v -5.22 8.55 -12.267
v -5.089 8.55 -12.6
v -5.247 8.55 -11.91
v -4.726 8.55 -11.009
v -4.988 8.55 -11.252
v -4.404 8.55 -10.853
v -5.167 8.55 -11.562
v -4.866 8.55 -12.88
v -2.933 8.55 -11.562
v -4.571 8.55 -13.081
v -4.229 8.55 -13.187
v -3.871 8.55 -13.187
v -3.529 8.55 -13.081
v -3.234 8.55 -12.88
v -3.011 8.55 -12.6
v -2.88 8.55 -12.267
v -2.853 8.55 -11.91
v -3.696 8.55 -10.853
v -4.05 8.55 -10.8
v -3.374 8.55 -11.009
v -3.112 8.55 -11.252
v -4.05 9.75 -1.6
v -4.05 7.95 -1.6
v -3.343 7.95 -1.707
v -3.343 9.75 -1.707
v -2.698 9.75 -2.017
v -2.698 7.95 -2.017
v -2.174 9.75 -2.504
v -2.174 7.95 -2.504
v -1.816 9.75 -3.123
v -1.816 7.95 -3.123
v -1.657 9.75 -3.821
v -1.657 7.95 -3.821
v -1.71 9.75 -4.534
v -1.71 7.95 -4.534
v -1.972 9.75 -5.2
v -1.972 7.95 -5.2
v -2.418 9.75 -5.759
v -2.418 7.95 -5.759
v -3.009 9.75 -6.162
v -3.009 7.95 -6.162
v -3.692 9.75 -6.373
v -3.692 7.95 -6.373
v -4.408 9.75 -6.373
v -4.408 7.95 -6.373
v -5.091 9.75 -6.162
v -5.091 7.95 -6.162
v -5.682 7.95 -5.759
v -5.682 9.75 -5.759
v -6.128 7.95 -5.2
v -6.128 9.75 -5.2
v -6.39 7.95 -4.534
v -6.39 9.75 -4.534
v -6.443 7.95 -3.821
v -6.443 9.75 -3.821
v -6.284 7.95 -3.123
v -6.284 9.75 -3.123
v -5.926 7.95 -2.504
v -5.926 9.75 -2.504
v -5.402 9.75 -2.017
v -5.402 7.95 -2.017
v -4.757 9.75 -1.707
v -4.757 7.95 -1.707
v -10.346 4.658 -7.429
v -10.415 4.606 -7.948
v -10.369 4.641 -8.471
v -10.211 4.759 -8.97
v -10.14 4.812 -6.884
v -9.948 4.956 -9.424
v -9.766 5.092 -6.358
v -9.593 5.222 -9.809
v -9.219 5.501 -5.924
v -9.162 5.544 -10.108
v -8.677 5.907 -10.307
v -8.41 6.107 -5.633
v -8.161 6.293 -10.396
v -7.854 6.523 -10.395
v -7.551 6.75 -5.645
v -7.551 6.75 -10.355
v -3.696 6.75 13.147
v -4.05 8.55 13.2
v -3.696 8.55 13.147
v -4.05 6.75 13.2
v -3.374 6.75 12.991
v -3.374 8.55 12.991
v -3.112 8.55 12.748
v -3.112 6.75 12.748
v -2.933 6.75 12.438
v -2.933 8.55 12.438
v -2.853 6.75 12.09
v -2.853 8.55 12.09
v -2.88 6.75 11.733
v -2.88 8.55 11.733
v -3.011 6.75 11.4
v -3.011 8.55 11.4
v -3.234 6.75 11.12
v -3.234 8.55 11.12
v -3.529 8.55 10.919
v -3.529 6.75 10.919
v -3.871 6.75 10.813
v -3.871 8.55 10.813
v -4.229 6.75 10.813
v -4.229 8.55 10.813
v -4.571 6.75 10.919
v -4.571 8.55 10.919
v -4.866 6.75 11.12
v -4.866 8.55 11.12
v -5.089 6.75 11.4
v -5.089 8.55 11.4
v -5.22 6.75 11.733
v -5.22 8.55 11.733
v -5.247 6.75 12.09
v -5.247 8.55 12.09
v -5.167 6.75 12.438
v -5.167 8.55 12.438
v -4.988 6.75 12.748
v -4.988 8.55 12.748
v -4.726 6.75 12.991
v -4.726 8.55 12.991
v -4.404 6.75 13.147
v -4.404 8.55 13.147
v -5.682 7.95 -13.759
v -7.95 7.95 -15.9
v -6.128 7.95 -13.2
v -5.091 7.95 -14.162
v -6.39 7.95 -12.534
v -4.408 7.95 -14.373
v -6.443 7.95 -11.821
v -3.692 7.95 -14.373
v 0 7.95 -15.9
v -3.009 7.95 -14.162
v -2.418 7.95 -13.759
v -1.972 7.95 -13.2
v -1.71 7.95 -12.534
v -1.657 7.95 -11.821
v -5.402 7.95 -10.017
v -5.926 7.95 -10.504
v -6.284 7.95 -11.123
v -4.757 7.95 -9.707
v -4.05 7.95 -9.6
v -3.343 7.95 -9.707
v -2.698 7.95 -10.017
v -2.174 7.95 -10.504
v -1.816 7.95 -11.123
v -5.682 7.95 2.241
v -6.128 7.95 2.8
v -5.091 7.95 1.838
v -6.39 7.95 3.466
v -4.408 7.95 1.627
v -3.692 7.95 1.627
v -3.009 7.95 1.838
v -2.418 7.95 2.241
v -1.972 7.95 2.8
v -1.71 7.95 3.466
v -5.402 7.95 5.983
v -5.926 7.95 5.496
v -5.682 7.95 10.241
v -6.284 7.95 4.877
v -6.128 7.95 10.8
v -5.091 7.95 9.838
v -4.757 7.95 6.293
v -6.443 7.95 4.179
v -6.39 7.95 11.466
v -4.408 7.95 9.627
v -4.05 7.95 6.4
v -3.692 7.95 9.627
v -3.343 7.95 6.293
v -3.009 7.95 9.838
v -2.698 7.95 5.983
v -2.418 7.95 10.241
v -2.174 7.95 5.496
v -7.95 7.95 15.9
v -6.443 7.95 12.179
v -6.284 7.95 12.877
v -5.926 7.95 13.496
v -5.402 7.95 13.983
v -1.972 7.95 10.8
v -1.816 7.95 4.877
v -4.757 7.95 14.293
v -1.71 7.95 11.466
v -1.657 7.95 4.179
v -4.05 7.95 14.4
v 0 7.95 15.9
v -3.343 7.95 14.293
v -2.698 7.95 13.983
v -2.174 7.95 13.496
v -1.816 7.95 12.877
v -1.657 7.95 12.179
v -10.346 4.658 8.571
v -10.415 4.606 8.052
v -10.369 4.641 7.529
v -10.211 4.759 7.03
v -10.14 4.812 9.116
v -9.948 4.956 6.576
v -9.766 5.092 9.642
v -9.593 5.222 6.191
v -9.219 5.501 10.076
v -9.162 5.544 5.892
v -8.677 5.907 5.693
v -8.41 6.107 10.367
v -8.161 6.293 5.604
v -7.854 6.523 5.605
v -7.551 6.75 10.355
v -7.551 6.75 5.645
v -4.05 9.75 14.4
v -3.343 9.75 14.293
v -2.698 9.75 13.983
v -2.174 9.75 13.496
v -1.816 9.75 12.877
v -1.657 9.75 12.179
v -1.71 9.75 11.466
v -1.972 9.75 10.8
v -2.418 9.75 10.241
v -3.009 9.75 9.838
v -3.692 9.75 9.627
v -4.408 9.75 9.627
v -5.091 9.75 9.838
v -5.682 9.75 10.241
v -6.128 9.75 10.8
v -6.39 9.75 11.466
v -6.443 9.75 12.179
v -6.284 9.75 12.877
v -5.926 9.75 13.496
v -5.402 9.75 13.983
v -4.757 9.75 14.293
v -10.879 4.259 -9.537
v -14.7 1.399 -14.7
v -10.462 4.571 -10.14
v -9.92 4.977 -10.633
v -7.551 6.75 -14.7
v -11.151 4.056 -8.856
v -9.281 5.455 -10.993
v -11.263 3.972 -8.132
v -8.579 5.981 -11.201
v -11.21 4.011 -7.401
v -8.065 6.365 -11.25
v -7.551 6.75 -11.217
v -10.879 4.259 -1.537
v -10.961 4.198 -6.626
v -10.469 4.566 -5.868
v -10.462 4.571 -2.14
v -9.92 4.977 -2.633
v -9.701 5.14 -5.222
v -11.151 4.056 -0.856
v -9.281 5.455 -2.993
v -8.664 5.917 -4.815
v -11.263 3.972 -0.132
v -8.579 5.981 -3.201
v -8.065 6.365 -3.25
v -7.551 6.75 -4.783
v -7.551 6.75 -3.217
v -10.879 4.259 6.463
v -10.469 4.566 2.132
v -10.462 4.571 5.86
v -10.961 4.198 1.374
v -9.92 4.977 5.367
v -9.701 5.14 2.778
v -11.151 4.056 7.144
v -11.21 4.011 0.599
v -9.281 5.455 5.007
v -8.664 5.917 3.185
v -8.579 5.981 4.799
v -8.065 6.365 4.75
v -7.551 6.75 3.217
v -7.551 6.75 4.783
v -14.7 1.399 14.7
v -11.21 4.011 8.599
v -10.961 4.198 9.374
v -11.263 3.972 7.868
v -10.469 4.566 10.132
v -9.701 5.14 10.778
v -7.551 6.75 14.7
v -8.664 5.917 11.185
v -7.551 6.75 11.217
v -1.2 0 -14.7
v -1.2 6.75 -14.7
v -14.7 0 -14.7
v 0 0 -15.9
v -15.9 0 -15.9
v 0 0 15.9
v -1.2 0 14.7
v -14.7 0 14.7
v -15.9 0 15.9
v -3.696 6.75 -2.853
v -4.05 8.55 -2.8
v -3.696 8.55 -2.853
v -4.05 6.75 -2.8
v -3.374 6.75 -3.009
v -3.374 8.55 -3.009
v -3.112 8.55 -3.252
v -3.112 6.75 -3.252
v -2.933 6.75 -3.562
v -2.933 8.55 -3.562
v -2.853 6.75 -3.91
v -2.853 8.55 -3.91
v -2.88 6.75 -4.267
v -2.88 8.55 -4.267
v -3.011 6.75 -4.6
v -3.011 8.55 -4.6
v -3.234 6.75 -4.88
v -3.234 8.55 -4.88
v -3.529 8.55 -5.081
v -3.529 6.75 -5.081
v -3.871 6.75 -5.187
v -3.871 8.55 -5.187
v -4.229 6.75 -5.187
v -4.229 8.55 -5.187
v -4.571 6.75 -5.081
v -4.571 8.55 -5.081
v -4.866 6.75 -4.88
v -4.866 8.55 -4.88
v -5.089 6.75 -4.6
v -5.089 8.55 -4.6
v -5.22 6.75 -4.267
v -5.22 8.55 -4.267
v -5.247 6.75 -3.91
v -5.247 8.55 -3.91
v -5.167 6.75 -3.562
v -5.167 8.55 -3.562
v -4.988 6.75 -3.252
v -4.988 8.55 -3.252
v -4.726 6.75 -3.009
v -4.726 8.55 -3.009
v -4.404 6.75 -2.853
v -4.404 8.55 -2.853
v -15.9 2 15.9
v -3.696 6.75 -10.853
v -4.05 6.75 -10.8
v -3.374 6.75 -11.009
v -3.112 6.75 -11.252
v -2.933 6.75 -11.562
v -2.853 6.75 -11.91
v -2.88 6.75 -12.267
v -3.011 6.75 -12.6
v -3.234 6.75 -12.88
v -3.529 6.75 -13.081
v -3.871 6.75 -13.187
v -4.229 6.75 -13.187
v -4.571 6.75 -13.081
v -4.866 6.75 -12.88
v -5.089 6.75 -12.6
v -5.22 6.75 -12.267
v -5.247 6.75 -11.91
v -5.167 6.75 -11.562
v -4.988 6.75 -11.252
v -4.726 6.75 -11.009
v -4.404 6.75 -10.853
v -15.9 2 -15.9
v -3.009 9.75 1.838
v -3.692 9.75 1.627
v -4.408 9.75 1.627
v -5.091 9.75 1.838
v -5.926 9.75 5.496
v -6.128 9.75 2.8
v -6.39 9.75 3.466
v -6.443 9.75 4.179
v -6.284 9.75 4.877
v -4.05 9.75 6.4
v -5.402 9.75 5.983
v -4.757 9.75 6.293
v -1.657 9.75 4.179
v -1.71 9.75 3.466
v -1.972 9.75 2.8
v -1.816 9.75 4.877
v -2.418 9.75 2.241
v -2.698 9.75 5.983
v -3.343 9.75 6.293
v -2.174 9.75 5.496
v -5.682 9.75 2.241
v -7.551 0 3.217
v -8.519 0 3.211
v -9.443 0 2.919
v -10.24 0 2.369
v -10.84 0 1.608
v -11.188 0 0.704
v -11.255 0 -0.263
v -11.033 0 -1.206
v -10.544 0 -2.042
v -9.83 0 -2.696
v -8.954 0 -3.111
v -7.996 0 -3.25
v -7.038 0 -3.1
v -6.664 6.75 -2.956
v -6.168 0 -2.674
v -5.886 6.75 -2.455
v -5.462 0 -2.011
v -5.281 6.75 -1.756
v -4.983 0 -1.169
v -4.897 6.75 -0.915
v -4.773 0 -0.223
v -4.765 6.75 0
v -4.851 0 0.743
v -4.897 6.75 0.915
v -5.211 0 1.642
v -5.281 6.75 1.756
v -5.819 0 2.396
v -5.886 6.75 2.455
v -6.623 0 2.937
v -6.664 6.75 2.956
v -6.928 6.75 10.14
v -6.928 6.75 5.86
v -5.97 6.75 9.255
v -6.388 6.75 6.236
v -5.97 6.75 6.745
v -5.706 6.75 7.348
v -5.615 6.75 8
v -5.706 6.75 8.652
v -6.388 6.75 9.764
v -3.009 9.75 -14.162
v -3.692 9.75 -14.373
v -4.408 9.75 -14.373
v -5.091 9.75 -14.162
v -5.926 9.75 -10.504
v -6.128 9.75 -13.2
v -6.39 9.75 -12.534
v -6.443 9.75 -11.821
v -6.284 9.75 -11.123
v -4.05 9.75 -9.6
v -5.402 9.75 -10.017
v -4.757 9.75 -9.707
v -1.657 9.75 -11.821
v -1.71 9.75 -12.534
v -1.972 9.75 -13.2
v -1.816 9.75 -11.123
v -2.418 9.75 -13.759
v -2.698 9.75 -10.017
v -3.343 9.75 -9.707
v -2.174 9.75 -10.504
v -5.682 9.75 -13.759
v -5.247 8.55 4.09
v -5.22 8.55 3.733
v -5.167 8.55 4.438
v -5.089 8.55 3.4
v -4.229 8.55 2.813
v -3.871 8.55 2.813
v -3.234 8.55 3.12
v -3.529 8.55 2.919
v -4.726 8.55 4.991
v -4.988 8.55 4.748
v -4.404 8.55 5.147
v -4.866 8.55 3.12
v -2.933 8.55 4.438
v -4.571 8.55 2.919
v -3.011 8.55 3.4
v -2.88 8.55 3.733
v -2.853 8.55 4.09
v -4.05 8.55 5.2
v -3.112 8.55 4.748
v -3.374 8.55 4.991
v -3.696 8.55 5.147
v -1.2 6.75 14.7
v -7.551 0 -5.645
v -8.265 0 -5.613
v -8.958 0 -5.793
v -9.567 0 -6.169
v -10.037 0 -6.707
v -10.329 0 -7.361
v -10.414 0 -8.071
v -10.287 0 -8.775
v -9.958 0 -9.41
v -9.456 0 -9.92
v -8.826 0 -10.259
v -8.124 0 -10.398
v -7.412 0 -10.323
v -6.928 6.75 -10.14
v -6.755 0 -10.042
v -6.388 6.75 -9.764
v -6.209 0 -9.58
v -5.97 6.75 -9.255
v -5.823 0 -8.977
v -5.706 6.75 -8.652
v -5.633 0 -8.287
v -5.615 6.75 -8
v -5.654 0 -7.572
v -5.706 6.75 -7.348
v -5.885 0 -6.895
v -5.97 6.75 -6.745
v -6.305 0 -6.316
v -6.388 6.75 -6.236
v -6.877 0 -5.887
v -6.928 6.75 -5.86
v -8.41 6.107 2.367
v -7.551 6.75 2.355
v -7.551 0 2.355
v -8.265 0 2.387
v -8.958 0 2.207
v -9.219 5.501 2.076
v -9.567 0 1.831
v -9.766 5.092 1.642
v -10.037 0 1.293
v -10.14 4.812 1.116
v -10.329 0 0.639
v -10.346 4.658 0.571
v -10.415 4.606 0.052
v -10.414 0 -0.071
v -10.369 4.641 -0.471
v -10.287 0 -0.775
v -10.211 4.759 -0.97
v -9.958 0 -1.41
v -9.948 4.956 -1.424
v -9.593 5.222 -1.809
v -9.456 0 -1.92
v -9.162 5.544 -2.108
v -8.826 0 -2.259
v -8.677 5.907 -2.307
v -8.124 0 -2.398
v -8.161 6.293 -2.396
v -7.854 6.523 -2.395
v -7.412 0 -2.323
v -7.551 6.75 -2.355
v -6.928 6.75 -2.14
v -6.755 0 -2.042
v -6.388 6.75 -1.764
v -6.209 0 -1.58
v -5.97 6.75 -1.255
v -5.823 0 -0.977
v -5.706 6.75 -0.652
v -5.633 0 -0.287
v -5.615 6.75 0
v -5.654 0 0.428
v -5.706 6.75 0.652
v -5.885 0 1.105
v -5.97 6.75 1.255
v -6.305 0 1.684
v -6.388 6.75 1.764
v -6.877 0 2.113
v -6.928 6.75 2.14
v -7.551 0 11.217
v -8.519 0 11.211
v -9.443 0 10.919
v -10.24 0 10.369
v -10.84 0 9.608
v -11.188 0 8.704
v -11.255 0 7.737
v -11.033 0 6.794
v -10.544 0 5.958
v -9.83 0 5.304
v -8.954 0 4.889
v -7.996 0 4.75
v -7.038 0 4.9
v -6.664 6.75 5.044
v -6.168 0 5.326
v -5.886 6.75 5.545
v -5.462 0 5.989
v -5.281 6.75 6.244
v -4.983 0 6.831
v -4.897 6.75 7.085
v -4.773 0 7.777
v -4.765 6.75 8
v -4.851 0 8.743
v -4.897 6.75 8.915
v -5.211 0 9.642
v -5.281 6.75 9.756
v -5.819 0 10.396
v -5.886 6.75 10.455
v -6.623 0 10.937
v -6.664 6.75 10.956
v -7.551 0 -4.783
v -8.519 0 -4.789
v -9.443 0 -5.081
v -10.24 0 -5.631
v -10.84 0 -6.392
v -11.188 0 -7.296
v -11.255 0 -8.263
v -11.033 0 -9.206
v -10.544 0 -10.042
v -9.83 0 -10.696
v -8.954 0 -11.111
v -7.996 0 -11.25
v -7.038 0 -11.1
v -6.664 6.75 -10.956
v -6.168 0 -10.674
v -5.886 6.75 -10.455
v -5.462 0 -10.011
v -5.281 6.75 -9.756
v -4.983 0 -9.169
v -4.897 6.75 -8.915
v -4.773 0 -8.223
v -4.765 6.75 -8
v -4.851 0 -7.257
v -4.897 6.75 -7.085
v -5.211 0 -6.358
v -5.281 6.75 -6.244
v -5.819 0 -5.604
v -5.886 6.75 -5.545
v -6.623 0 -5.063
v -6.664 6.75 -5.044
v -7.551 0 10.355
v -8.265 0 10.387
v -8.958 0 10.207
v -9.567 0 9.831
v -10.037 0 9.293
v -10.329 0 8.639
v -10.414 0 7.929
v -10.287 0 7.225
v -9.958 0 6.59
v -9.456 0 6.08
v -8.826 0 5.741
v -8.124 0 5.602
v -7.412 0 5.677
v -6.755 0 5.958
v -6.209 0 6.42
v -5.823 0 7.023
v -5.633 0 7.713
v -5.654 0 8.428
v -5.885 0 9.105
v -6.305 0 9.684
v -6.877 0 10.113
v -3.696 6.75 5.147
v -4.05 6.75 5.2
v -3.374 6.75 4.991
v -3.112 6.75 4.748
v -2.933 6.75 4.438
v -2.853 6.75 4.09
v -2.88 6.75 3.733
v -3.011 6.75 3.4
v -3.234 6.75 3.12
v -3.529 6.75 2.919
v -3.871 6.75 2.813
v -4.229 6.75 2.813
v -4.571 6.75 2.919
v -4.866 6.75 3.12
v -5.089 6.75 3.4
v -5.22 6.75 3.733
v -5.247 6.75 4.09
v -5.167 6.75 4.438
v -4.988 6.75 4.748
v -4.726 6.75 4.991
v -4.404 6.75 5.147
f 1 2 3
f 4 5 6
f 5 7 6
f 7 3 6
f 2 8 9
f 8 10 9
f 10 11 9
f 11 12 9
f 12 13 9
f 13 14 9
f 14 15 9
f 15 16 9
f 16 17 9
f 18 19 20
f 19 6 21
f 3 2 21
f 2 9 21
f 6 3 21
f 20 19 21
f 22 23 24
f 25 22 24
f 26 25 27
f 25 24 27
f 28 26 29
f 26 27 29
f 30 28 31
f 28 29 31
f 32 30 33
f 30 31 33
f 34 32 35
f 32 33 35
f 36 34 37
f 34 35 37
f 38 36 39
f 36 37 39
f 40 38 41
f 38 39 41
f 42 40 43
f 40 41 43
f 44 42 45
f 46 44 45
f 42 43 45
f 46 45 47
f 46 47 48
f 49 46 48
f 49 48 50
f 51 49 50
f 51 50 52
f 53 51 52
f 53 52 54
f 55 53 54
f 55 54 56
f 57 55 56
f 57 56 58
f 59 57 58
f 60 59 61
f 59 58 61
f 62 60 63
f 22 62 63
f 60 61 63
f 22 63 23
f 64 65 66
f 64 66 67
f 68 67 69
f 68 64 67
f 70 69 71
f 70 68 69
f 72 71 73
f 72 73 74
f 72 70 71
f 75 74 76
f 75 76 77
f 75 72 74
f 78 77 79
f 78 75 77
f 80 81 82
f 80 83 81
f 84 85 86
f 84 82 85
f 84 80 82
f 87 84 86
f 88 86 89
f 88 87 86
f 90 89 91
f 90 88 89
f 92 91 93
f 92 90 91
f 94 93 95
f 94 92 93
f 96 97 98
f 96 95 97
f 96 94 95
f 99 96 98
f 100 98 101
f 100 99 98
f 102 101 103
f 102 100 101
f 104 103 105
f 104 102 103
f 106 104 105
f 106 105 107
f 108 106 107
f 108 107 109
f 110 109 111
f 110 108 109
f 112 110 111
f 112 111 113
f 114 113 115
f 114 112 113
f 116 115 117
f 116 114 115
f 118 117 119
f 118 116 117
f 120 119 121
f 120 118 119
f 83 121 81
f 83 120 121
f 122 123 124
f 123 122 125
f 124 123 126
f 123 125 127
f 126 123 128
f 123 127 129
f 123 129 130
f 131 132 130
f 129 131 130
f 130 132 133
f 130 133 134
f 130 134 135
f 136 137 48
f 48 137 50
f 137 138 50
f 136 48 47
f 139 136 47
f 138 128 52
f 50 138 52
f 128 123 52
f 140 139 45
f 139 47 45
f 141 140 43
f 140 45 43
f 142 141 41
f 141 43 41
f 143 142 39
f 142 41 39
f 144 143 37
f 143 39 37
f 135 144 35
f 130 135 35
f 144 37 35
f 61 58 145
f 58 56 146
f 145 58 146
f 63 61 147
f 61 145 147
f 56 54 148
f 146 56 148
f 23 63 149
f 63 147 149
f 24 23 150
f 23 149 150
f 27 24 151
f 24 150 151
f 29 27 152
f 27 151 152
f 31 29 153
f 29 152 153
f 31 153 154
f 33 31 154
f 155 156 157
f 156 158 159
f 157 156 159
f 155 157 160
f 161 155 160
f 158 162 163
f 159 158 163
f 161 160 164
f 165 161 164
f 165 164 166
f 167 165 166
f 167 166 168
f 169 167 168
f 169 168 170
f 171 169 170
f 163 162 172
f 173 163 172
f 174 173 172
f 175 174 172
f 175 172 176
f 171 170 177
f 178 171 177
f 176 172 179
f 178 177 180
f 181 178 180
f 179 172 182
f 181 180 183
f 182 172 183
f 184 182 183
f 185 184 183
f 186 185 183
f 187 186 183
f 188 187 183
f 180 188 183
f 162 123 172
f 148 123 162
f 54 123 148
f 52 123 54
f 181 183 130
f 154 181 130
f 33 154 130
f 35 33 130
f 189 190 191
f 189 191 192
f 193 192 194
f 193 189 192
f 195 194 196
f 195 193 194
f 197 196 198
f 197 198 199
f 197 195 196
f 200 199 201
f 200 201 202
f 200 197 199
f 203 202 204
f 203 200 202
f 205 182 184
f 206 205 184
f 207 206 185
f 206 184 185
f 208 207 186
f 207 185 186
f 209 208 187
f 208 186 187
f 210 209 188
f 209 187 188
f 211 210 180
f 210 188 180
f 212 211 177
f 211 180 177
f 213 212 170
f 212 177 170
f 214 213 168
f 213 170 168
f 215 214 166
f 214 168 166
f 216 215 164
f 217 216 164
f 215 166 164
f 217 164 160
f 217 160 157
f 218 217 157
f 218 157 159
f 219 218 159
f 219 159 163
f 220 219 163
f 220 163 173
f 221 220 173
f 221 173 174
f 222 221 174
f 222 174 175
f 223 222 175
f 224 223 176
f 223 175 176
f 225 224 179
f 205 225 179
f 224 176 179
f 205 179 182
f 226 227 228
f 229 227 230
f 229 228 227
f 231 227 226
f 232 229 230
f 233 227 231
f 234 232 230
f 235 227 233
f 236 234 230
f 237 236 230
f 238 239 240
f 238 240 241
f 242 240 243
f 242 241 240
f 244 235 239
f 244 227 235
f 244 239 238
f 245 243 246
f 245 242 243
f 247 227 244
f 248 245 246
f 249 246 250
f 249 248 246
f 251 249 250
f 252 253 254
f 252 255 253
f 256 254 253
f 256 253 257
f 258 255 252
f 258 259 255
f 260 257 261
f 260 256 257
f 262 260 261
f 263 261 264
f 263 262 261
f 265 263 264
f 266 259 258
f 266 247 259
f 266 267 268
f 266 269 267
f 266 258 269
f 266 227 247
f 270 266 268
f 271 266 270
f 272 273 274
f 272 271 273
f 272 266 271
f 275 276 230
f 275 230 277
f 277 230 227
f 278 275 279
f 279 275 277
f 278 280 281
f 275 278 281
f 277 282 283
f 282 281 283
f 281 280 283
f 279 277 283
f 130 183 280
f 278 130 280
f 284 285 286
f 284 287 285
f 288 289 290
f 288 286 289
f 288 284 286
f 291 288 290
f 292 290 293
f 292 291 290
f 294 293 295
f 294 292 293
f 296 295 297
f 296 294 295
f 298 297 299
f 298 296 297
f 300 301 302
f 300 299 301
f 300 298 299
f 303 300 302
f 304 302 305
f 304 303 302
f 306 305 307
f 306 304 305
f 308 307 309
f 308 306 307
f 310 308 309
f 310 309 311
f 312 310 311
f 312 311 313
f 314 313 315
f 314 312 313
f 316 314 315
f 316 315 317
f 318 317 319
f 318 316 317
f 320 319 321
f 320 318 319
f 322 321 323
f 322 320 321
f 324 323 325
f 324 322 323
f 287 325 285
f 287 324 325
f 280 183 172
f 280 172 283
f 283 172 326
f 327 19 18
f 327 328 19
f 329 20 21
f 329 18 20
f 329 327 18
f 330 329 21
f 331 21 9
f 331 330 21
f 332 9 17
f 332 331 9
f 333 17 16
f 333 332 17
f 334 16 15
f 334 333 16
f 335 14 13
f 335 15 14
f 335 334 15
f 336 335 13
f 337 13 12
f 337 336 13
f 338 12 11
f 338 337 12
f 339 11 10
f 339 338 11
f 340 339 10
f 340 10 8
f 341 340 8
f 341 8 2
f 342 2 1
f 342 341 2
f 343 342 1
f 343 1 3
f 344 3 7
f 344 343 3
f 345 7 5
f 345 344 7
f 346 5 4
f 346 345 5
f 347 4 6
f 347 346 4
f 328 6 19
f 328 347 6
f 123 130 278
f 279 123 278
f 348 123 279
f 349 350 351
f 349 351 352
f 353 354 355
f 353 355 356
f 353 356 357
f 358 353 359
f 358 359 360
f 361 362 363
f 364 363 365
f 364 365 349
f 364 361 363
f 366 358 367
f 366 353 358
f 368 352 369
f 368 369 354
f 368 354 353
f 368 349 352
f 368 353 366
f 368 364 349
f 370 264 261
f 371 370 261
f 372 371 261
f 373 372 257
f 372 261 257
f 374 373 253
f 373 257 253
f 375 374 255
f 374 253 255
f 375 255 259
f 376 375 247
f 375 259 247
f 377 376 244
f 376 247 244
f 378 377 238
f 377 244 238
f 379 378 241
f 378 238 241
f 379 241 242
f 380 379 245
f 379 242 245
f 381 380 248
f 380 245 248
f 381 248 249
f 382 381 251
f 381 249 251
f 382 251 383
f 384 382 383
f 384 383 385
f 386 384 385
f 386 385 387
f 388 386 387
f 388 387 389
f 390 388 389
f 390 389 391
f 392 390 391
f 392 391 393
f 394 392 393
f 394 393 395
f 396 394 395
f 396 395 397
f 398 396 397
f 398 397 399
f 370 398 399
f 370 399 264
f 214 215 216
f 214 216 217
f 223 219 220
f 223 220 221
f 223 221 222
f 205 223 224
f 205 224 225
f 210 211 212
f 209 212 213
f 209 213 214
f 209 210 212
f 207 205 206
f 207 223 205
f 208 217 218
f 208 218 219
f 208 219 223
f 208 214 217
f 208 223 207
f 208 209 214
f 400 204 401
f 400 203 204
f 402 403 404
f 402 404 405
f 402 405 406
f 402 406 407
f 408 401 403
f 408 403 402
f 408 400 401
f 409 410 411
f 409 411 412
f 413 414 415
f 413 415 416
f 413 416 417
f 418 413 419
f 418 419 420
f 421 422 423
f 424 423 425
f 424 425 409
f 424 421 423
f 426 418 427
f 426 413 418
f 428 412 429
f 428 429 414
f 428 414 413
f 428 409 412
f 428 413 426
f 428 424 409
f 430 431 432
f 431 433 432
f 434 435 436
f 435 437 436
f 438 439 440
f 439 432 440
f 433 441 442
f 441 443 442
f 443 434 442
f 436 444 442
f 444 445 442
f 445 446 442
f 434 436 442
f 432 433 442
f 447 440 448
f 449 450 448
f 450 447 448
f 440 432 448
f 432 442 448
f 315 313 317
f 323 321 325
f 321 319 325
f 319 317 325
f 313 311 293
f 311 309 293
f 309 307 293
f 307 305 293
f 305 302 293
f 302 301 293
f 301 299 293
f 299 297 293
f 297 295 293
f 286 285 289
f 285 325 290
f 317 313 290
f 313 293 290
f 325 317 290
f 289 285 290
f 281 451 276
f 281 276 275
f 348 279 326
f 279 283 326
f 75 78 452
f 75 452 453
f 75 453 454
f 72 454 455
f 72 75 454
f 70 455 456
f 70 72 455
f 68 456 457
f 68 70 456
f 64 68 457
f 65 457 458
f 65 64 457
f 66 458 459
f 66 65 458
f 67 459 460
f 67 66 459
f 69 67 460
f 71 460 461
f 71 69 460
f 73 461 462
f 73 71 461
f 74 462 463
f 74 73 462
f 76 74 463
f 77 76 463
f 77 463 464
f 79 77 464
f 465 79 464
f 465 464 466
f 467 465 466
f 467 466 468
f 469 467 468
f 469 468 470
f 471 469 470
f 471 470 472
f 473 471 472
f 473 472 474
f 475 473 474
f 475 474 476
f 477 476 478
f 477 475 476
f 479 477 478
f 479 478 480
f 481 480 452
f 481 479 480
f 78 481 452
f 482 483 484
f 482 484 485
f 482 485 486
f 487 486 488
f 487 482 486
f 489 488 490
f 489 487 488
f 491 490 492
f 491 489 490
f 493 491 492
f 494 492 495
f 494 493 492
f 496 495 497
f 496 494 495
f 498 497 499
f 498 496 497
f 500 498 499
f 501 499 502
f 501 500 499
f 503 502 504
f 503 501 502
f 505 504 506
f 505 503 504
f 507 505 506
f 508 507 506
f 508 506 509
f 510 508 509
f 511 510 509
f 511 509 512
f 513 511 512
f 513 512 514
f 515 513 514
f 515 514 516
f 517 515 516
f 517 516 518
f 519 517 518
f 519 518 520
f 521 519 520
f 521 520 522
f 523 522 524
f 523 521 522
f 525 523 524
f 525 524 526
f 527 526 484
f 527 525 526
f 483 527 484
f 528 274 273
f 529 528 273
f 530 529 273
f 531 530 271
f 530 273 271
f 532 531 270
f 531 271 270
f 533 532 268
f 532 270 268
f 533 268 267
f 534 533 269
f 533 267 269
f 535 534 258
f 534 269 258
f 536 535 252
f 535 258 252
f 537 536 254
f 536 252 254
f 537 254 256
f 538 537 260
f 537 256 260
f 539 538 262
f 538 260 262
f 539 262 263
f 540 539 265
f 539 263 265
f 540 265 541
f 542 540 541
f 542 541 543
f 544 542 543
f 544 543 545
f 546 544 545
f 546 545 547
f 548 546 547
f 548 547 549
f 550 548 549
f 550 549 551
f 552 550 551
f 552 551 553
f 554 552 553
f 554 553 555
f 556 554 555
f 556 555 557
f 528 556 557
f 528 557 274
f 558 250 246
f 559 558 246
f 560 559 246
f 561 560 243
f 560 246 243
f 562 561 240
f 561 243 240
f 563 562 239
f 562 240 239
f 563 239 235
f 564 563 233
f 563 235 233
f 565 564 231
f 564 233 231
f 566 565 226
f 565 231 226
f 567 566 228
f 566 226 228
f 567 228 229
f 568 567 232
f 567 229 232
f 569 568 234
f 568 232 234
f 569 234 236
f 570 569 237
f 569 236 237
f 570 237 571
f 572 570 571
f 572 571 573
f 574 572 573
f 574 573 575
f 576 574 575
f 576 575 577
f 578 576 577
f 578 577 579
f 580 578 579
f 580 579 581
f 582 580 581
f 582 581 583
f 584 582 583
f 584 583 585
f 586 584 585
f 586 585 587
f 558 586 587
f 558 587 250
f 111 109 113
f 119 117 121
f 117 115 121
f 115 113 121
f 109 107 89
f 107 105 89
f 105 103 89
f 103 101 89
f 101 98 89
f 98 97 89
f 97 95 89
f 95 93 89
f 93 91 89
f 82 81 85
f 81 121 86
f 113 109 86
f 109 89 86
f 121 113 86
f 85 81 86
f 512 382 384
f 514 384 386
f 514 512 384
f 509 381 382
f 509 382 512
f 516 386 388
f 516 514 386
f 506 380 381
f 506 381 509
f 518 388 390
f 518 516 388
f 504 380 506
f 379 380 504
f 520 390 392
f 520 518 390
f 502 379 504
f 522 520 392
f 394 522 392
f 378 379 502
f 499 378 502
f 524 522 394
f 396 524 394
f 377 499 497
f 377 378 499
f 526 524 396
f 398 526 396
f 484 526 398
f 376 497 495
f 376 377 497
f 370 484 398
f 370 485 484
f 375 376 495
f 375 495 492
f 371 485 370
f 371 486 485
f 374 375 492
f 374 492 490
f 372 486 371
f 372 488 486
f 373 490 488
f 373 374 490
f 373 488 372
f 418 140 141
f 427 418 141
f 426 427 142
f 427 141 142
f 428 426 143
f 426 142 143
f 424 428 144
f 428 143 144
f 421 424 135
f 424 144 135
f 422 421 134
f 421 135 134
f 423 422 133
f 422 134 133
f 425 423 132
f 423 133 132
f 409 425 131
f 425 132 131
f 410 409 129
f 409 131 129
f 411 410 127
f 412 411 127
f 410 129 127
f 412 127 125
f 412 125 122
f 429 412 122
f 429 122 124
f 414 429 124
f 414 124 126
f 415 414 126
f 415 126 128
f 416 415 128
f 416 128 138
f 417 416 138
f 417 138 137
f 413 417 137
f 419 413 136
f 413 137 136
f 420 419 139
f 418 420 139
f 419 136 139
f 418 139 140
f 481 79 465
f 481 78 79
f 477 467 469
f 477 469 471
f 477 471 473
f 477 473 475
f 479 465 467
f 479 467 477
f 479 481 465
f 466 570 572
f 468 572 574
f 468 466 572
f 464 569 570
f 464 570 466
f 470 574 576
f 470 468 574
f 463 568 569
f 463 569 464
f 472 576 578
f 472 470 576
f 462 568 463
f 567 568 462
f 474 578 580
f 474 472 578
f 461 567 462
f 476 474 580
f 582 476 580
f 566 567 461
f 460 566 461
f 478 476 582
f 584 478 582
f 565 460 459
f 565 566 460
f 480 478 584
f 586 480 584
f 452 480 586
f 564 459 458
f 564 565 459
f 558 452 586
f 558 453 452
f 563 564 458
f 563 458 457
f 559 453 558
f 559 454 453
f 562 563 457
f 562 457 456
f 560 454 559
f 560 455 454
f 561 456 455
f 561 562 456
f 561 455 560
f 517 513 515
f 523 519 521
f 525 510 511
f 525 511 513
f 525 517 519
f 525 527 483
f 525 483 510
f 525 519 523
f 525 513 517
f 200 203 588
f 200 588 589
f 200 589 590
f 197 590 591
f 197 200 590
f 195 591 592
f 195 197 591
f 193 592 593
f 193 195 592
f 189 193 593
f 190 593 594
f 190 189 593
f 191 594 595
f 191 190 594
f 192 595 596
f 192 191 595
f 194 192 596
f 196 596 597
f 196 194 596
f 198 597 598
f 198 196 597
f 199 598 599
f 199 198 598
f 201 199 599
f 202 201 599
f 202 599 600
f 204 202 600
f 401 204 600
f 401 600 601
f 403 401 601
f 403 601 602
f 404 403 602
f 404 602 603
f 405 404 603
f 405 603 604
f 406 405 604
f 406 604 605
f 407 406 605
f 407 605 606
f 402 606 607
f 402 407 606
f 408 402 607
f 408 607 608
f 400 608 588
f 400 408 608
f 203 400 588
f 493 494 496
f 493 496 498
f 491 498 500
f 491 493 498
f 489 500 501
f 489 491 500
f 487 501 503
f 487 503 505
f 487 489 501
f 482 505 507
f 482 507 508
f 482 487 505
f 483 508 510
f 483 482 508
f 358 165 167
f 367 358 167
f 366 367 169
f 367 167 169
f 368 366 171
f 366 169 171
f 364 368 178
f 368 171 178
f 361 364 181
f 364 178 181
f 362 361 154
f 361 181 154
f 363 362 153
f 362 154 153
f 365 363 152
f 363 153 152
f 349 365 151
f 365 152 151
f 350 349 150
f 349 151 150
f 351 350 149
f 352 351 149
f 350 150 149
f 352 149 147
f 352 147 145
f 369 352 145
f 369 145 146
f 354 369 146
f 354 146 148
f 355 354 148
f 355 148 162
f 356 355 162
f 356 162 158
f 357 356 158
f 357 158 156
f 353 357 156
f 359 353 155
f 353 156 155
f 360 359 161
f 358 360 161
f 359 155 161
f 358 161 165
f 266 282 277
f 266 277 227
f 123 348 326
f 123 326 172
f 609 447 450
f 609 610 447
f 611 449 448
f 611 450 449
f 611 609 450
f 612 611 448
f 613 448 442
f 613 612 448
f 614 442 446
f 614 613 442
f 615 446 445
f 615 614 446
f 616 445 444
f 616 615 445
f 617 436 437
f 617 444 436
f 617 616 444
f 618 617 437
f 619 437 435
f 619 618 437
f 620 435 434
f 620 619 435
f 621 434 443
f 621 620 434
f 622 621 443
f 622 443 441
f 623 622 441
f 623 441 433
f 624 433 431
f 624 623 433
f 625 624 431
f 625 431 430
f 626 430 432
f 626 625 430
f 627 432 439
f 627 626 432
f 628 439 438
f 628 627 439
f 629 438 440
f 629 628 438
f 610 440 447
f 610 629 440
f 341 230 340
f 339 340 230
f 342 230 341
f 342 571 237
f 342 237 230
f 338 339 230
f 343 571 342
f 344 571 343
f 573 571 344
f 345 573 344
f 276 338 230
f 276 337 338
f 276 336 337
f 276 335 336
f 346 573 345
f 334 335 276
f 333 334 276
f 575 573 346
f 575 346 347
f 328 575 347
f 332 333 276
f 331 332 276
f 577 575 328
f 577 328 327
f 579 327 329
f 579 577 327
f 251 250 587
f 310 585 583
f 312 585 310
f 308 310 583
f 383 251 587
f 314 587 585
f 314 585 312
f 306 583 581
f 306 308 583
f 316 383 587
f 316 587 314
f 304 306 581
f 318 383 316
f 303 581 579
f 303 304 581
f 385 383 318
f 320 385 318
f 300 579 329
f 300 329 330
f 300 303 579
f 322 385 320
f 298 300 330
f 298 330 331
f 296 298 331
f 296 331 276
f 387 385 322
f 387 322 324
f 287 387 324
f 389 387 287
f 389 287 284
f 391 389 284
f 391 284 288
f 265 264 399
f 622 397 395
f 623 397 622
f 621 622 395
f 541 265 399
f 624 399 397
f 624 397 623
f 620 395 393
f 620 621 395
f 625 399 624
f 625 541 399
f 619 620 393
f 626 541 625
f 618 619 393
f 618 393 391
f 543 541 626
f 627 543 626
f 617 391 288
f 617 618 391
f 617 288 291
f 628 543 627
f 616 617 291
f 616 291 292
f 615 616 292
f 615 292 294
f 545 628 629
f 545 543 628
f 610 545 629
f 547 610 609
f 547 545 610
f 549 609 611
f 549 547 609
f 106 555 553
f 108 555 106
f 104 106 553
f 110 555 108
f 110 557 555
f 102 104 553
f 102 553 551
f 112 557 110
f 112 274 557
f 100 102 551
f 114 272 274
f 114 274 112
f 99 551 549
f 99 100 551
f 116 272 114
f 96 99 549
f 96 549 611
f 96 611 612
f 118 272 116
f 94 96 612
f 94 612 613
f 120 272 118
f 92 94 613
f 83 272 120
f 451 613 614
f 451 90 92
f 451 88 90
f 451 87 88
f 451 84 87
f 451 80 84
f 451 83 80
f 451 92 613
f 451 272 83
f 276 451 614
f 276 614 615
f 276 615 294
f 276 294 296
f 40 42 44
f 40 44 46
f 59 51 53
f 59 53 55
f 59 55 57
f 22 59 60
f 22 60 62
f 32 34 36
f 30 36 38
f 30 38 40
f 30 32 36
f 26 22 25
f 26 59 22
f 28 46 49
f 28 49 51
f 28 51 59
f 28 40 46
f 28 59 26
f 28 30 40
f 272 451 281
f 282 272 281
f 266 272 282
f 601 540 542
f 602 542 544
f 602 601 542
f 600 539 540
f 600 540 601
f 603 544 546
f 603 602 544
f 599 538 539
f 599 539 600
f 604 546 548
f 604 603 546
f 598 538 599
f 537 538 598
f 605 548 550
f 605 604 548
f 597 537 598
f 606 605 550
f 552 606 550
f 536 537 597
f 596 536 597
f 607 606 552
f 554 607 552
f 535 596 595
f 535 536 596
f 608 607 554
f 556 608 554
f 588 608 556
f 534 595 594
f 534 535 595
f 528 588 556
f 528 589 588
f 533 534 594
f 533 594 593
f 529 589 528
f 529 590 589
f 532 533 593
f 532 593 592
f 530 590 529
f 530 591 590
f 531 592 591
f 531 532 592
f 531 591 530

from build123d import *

# Parameters (mm, degrees)
BOSS_EXTRUDE1_DEPTH = 15.9
SKETCH2_R           = 2.4
BOSS_EXTRUDE2_DEPTH = 1.8
LPATTERN1_COUNT     = 4
LPATTERN1_PITCH     = 8
SHELL1_T            = -1.2
SKETCH3_R           = 3.25
SKETCH3_R_2         = 2.4
BOSS_EXTRUDE3_DEPTH = 6.75
LPATTERN3_COUNT     = 2
LPATTERN3_PITCH     = 8
LPATTERN3_COL_COUNT = 2
LPATTERN3_COL_PITCH = 8
SKETCH4_W           = 9.930005036
SKETCH4_H           = 31.8
CUT_EXTRUDE1_DEPTH  = 21.430775863


with BuildPart() as part:
    # Sketch1 → Boss-Extrude1 (new, symmetric)
    with BuildSketch(Plane.XY):
        Polygon((0, 0), (-15.9, 0), (-15.9, 2), (-7.95, 7.95), (0, 7.95), align=None)
    extrude(amount=BOSS_EXTRUDE1_DEPTH, both=True)

    # Sketch2 → Boss-Extrude2 (add)
    with BuildSketch(Plane(origin=(0, 7.95, 0), x_dir=(1, 0, 0), z_dir=(0, 1, 0))):
        with Locations(Location((-4.05, -12, 0), (0, 0, 270))):
            Circle(SKETCH2_R)
    boss_extrude2 = extrude(amount=BOSS_EXTRUDE2_DEPTH)

    # LPattern1: Boss-Extrude2 ×4
    with Locations(*[(0, 0, -i * LPATTERN1_PITCH) for i in range(1, LPATTERN1_COUNT)]):
        add(boss_extrude2)

    # Shell1
    shell1_openings = [part.faces().sort_by_distance(p)[0] for p in [
        (-7.95, 0, 0),
    ]]
    offset(amount=SHELL1_T, openings=shell1_openings, kind=Kind.INTERSECTION)

    # Sketch3 → Boss-Extrude3 (add)
    with BuildSketch(Plane.XZ.offset(-6.75)):
        with Locations(Location((-8.015401462, 0, 0), (0, 0, 81.778871815))):
            Circle(SKETCH3_R)
        with Locations(Location((-8.015401462, 0, 0), (0, 0, 78.834853806))):
            Circle(SKETCH3_R_2, mode=Mode.SUBTRACT)
    boss_extrude3 = extrude(amount=BOSS_EXTRUDE3_DEPTH)

    # LPattern3: Boss-Extrude3 ×2
    with Locations(*[(0, 0, -i * LPATTERN3_PITCH) for i in range(1, LPATTERN3_COUNT)]):
        add(boss_extrude3)

    # LPattern3 col: Boss-Extrude3 ×2
    with Locations(*[(0, 0, i * LPATTERN3_COL_PITCH) for i in range(1, LPATTERN3_COL_COUNT)]):
        add(boss_extrude3)

    # Sketch4 → Cut-Extrude1 (cut, through all)
    with BuildSketch(Plane(origin=(-6.668067035, 8.909434106, 0), x_dir=(0.8006038236418165, 0.5991940566879009, 0), z_dir=(-0.5991940566879009, 0.8006038236418165, 0))):
        with Locations((-6.566210165, 0)):
            Rectangle(SKETCH4_W, SKETCH4_H)
    extrude(amount=CUT_EXTRUDE1_DEPTH, mode=Mode.SUBTRACT)


solid = part.part
